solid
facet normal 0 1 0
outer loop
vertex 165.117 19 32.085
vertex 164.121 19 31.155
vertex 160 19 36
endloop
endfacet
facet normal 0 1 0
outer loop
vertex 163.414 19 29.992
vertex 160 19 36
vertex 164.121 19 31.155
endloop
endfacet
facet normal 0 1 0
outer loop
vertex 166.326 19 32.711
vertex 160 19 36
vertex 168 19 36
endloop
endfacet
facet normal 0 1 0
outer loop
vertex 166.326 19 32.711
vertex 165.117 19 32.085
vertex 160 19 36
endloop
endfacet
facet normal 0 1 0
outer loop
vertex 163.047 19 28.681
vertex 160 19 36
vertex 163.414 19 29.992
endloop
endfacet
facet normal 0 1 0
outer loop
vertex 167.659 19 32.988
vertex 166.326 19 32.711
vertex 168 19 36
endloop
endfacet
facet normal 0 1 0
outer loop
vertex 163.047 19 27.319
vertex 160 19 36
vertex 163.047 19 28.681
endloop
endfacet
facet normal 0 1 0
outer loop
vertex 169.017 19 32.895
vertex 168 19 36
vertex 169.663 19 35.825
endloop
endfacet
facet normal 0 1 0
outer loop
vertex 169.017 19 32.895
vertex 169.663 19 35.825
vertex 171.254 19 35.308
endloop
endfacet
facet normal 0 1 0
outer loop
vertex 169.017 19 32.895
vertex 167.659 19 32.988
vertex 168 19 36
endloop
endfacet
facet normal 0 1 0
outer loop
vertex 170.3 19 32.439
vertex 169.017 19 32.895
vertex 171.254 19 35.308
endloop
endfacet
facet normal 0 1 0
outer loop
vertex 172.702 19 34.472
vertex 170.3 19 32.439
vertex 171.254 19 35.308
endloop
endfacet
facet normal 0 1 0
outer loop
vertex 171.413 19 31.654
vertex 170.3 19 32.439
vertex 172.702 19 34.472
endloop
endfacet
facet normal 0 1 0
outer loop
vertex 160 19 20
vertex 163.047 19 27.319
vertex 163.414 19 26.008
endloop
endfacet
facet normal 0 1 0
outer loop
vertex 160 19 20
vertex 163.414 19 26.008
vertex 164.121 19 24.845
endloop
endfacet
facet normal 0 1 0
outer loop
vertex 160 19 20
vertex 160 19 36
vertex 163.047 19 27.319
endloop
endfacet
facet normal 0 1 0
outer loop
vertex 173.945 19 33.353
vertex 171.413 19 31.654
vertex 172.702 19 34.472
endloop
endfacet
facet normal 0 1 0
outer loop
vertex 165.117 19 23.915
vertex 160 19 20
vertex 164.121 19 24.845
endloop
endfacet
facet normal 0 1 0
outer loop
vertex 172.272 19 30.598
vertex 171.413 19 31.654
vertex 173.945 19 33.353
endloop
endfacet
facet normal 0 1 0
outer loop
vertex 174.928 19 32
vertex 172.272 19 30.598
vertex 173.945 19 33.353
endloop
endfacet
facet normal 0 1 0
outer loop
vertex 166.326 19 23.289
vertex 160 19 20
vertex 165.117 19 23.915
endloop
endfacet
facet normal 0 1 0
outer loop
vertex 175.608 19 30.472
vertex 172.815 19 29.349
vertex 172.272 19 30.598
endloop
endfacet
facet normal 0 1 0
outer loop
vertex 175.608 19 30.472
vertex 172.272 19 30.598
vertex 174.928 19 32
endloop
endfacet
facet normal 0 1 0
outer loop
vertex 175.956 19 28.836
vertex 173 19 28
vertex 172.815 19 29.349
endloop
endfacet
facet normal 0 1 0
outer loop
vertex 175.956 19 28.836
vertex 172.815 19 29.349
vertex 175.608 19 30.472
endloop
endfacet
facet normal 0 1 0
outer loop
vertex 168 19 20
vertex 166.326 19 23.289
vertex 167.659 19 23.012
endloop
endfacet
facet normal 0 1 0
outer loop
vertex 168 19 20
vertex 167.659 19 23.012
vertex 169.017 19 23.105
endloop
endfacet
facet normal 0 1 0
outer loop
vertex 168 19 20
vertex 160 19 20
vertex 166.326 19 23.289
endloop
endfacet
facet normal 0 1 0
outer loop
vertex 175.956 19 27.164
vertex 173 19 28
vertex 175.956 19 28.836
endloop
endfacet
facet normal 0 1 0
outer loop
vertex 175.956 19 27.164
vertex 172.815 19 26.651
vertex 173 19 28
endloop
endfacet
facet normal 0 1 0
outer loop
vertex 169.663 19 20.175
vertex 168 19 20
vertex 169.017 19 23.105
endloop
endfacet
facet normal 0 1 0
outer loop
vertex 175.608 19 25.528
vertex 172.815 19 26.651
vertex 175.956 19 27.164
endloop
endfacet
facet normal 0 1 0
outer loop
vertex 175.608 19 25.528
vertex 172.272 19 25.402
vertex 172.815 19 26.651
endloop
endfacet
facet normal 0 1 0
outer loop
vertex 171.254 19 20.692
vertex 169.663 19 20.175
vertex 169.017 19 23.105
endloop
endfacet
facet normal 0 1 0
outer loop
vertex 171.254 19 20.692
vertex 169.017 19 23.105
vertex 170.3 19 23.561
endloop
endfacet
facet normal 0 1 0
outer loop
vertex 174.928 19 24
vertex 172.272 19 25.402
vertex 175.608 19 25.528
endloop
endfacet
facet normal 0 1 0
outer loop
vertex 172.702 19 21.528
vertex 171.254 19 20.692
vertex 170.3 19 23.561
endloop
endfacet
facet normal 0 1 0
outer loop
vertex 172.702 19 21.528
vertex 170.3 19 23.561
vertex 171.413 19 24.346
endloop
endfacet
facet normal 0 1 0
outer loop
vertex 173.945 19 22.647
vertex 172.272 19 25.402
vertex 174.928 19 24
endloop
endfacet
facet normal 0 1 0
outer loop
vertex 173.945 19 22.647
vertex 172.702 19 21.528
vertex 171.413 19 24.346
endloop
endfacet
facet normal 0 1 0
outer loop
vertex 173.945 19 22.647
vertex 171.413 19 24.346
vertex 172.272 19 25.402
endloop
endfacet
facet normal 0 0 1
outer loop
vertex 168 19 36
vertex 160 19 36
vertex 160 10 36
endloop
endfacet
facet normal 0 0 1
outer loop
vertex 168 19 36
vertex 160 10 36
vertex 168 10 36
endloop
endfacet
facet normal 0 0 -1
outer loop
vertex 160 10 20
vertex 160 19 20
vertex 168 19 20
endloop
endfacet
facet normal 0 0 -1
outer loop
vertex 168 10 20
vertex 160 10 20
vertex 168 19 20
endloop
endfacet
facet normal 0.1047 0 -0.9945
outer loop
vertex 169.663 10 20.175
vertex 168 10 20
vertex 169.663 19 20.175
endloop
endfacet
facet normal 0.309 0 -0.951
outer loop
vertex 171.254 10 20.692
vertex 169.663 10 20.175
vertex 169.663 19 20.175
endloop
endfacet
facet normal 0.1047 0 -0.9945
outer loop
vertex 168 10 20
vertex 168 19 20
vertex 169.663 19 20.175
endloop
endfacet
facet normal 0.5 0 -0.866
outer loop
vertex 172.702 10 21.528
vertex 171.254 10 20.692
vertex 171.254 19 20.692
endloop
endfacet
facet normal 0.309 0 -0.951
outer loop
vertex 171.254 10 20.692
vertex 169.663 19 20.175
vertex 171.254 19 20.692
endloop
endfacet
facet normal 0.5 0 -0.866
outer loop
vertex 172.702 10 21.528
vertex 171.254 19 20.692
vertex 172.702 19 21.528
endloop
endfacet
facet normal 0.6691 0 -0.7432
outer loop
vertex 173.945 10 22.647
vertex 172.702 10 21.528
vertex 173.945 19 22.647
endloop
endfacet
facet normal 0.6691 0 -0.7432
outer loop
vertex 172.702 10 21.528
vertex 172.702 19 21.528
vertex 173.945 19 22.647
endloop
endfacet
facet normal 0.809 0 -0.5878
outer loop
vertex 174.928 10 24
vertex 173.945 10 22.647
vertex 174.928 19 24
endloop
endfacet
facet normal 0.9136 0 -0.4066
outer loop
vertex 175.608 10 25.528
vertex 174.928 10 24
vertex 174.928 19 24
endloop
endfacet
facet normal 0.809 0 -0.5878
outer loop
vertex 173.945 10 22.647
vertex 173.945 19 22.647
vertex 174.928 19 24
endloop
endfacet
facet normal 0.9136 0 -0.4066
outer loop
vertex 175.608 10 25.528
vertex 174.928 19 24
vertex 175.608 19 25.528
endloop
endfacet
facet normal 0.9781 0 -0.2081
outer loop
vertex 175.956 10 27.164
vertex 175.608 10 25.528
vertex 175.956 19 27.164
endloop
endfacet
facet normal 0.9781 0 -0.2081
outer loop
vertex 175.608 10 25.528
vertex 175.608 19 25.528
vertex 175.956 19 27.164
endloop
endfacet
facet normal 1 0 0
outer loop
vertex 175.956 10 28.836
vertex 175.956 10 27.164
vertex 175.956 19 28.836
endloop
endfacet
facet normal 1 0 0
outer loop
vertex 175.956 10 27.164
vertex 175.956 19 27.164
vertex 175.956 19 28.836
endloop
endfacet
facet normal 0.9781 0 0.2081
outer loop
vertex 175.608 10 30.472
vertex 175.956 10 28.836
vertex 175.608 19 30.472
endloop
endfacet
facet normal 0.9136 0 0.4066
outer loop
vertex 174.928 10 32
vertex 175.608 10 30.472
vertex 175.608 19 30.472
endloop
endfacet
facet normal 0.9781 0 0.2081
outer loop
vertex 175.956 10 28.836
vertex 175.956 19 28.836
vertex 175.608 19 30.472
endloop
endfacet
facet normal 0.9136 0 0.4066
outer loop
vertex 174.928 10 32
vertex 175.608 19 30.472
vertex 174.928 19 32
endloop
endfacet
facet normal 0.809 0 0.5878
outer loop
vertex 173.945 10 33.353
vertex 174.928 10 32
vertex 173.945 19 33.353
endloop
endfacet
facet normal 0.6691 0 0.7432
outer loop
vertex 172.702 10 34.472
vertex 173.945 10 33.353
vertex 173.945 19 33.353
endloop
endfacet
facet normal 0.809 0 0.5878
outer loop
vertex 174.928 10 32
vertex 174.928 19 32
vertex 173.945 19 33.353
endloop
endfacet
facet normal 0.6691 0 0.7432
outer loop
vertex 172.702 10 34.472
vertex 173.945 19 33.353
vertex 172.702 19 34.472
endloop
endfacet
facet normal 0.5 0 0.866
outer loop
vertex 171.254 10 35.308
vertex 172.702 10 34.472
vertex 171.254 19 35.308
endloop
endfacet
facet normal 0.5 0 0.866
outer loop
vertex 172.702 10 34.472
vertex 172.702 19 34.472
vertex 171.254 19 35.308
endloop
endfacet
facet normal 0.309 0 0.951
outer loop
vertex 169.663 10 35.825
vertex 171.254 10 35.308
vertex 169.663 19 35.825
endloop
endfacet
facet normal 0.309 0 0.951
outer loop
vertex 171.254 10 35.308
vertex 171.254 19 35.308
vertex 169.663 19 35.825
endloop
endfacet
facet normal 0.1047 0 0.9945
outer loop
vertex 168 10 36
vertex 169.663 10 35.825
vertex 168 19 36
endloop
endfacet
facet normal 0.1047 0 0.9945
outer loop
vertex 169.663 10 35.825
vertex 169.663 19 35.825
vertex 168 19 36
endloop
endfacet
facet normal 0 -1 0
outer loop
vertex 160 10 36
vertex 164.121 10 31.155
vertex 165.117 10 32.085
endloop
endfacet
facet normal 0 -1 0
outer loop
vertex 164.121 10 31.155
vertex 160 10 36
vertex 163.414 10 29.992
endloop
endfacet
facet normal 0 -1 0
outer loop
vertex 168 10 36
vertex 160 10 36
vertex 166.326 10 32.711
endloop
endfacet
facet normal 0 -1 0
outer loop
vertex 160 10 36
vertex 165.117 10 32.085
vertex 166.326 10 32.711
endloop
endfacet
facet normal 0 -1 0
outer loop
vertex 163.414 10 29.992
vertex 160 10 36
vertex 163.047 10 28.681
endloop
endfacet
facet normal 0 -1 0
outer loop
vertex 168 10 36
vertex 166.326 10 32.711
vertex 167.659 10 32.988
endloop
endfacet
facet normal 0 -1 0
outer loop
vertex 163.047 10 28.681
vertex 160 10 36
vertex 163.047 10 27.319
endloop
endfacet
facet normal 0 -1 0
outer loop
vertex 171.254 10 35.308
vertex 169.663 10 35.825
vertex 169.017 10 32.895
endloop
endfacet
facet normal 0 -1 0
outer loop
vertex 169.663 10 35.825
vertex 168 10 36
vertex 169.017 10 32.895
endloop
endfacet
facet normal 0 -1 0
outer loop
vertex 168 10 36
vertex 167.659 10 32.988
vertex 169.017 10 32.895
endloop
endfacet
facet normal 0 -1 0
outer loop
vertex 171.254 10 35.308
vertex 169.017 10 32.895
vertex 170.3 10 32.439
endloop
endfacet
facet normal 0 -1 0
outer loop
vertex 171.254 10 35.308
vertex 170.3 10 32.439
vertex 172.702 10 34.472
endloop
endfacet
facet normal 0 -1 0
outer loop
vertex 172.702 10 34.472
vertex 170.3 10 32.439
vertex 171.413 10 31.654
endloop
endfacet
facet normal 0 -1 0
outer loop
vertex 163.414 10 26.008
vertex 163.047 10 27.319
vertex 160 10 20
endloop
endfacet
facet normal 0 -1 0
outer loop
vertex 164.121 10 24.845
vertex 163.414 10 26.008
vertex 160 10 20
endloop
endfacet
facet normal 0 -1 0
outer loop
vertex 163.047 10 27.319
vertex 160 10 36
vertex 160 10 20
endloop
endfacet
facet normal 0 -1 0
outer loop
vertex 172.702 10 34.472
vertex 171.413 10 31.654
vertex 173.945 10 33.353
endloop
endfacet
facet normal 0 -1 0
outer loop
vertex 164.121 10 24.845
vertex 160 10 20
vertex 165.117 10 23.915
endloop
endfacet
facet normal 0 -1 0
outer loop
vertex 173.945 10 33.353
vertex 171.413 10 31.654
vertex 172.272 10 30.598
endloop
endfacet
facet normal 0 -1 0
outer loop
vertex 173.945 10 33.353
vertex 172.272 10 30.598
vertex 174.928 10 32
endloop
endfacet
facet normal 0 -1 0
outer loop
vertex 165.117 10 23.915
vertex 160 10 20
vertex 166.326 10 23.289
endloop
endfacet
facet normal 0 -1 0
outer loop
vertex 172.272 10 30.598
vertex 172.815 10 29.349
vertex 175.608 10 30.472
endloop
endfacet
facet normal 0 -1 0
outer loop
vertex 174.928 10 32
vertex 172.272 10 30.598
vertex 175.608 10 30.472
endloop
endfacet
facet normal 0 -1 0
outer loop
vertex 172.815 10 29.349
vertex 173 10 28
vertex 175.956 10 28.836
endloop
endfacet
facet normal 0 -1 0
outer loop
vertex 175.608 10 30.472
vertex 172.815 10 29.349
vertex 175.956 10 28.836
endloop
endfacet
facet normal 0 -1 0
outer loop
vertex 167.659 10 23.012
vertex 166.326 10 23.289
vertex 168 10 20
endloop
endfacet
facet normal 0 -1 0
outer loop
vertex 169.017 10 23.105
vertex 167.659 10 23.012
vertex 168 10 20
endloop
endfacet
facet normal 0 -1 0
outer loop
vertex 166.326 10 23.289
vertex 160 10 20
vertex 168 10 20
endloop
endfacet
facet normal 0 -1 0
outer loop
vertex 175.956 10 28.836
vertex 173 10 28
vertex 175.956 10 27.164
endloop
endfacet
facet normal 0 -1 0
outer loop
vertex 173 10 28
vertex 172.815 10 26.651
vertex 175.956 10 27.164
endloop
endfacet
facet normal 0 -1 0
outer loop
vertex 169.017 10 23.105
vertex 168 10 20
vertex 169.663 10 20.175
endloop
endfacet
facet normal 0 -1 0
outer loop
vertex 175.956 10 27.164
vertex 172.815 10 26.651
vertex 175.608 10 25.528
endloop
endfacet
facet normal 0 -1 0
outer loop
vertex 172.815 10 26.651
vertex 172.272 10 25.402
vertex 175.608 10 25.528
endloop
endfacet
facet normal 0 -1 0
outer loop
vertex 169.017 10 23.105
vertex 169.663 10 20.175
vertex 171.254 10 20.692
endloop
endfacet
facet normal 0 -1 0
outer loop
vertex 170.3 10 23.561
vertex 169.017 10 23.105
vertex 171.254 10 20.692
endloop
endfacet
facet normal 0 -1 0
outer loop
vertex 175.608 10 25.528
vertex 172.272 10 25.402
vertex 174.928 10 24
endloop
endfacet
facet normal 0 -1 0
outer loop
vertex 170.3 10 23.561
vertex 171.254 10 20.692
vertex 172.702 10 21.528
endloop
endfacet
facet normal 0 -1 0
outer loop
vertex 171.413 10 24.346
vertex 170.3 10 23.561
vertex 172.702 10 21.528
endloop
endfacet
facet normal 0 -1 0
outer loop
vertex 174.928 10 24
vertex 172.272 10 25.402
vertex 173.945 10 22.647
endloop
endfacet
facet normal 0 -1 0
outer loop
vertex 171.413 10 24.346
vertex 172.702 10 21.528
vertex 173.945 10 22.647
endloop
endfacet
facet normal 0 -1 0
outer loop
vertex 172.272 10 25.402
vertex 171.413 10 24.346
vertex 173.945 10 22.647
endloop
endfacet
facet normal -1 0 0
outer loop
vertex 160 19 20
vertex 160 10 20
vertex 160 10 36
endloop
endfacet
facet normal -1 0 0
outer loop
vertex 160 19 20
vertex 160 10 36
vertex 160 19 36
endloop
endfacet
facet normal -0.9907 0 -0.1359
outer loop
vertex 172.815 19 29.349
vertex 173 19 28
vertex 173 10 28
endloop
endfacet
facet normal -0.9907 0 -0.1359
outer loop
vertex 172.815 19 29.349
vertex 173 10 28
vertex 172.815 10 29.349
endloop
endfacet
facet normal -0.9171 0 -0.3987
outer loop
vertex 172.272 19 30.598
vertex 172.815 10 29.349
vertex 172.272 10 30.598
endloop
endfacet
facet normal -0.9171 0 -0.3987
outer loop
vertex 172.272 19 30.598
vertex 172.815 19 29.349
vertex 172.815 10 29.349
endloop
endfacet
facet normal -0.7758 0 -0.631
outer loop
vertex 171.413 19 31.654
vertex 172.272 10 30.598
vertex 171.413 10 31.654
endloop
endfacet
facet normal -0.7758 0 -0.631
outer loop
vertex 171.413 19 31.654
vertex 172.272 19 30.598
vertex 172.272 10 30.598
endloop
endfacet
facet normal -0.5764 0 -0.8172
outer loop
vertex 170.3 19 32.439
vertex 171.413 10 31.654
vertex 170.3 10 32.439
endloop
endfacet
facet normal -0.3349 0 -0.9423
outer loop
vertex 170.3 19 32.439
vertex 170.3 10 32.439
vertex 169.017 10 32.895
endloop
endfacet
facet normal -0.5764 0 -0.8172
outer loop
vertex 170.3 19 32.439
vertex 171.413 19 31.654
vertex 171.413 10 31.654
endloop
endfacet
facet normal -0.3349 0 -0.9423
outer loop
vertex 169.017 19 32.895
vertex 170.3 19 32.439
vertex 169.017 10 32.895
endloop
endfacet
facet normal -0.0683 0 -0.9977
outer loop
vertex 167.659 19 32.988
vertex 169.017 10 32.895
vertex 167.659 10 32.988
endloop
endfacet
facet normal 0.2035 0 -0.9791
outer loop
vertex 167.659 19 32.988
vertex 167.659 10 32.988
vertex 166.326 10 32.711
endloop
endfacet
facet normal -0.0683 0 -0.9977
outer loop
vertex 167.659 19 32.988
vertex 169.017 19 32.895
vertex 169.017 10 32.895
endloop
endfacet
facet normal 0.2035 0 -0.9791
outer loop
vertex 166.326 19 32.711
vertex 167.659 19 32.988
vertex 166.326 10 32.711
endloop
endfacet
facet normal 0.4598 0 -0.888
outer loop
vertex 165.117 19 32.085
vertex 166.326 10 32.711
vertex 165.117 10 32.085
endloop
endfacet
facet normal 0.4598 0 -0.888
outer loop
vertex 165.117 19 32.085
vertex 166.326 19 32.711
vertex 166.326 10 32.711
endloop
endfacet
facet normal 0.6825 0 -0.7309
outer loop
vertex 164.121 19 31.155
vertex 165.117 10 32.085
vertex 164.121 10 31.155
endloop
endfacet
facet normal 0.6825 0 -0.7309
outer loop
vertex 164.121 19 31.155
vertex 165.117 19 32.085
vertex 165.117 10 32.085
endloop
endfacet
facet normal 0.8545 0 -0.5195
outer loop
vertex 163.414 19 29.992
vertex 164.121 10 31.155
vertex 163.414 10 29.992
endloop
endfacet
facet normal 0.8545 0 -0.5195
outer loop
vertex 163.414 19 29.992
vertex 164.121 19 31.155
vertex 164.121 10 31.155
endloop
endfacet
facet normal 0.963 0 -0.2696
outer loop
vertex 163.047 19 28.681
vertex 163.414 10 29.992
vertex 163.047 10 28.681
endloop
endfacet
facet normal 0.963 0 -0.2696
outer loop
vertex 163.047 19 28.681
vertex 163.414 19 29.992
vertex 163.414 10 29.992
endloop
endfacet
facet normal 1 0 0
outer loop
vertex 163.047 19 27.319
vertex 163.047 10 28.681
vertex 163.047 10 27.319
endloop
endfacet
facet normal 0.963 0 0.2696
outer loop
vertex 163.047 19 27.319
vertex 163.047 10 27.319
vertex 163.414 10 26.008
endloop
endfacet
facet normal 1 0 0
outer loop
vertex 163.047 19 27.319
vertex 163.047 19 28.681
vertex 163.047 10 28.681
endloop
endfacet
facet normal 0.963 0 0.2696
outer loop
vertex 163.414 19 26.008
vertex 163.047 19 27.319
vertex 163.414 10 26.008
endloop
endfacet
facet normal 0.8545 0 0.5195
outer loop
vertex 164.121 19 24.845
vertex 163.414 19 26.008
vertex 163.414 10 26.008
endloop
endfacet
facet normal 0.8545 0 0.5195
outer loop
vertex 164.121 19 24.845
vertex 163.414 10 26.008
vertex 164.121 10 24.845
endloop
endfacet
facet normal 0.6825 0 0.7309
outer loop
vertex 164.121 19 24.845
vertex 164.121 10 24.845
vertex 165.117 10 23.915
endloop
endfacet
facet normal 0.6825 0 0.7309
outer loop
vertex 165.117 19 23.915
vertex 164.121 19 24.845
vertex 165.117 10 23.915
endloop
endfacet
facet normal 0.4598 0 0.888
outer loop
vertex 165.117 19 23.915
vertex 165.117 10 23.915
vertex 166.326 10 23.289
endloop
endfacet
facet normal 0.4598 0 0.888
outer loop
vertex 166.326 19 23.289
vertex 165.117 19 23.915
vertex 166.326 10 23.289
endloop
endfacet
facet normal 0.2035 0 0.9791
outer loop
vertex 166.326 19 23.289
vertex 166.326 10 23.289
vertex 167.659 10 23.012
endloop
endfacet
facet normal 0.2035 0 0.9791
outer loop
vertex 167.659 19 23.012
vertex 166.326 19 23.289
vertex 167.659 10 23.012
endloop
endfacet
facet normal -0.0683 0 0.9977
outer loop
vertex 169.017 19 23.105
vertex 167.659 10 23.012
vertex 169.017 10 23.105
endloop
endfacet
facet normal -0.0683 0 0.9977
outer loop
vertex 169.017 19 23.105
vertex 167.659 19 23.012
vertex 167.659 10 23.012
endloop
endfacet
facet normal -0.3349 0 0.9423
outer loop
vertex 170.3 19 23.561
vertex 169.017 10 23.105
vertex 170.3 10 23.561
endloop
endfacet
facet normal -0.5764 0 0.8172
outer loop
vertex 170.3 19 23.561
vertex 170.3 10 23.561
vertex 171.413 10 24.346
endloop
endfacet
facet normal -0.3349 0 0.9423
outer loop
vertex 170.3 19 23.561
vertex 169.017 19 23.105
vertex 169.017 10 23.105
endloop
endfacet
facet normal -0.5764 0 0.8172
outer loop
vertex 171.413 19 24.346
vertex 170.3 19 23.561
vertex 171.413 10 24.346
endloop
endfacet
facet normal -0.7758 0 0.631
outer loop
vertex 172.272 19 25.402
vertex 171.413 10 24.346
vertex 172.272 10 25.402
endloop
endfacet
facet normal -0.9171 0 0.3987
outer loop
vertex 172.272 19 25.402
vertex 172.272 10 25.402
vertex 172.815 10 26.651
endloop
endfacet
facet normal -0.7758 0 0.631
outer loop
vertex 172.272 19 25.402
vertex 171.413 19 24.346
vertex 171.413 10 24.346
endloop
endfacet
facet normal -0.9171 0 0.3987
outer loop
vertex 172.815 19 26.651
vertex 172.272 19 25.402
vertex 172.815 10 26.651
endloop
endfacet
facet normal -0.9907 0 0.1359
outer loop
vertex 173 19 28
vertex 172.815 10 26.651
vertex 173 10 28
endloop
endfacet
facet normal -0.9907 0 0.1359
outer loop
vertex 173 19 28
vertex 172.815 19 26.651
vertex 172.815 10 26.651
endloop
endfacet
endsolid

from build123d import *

# Parameters (mm, degrees)
CYLINDER022_R          = 5
CYLINDER022_DEPTH      = 9
CYLINDER022_ROLL_ANGLE = 90
BOX030_W               = 8
BOX030_H               = 9
BOX030_DEPTH           = 16
CYLINDER021_R          = 8
CYLINDER021_DEPTH      = 9
CYLINDER021_ROLL_ANGLE = 90


with BuildPart() as zylinder008:
    # Cylinder022 → Cylinder022 (new body)
    with BuildSketch(Plane.XY):
        Circle(CYLINDER022_R)
    extrude(amount=CYLINDER022_DEPTH)


with BuildPart() as zylinder008_1:
    # Cylinder022 roll: moved
    add(zylinder008.part.rotate(Axis((0, 0, 0), (1, 0, 0)), CYLINDER022_ROLL_ANGLE))


with BuildPart() as zylinder008_2:
    # Cylinder022 placement: moved
    add(zylinder008_1.part.moved(Location((8, 9, 8))))


with BuildPart() as w_rfel023:
    # Box030 → Box030 (new body)
    with BuildSketch(Plane.XY):
        with Locations((4, 4.5)):
            Rectangle(BOX030_W, BOX030_H)
    extrude(amount=BOX030_DEPTH)


with BuildPart() as fixier_se001:
    # Cylinder021 → Cylinder021 (new body)
    with BuildSketch(Plane.XY):
        Circle(CYLINDER021_R)
    extrude(amount=CYLINDER021_DEPTH)


with BuildPart() as fixier_se001_1:
    # Cylinder021 roll: moved
    add(fixier_se001.part.rotate(Axis((0, 0, 0), (1, 0, 0)), CYLINDER021_ROLL_ANGLE))


with BuildPart() as fixier_se001_2:
    # Cylinder021 placement: moved
    add(fixier_se001_1.part.moved(Location((8, 9, 8))))

    # Fusion015: union Würfel023
    add(w_rfel023.part)

    # Cut020: cut Zylinder008
    add(zylinder008_2.part, mode=Mode.SUBTRACT)


with BuildPart() as fixier_se001_3:
    # Cut020 placement: moved
    add(fixier_se001_2.part.moved(Location((160, 10, 20))))


solid = fixier_se001_3.part
